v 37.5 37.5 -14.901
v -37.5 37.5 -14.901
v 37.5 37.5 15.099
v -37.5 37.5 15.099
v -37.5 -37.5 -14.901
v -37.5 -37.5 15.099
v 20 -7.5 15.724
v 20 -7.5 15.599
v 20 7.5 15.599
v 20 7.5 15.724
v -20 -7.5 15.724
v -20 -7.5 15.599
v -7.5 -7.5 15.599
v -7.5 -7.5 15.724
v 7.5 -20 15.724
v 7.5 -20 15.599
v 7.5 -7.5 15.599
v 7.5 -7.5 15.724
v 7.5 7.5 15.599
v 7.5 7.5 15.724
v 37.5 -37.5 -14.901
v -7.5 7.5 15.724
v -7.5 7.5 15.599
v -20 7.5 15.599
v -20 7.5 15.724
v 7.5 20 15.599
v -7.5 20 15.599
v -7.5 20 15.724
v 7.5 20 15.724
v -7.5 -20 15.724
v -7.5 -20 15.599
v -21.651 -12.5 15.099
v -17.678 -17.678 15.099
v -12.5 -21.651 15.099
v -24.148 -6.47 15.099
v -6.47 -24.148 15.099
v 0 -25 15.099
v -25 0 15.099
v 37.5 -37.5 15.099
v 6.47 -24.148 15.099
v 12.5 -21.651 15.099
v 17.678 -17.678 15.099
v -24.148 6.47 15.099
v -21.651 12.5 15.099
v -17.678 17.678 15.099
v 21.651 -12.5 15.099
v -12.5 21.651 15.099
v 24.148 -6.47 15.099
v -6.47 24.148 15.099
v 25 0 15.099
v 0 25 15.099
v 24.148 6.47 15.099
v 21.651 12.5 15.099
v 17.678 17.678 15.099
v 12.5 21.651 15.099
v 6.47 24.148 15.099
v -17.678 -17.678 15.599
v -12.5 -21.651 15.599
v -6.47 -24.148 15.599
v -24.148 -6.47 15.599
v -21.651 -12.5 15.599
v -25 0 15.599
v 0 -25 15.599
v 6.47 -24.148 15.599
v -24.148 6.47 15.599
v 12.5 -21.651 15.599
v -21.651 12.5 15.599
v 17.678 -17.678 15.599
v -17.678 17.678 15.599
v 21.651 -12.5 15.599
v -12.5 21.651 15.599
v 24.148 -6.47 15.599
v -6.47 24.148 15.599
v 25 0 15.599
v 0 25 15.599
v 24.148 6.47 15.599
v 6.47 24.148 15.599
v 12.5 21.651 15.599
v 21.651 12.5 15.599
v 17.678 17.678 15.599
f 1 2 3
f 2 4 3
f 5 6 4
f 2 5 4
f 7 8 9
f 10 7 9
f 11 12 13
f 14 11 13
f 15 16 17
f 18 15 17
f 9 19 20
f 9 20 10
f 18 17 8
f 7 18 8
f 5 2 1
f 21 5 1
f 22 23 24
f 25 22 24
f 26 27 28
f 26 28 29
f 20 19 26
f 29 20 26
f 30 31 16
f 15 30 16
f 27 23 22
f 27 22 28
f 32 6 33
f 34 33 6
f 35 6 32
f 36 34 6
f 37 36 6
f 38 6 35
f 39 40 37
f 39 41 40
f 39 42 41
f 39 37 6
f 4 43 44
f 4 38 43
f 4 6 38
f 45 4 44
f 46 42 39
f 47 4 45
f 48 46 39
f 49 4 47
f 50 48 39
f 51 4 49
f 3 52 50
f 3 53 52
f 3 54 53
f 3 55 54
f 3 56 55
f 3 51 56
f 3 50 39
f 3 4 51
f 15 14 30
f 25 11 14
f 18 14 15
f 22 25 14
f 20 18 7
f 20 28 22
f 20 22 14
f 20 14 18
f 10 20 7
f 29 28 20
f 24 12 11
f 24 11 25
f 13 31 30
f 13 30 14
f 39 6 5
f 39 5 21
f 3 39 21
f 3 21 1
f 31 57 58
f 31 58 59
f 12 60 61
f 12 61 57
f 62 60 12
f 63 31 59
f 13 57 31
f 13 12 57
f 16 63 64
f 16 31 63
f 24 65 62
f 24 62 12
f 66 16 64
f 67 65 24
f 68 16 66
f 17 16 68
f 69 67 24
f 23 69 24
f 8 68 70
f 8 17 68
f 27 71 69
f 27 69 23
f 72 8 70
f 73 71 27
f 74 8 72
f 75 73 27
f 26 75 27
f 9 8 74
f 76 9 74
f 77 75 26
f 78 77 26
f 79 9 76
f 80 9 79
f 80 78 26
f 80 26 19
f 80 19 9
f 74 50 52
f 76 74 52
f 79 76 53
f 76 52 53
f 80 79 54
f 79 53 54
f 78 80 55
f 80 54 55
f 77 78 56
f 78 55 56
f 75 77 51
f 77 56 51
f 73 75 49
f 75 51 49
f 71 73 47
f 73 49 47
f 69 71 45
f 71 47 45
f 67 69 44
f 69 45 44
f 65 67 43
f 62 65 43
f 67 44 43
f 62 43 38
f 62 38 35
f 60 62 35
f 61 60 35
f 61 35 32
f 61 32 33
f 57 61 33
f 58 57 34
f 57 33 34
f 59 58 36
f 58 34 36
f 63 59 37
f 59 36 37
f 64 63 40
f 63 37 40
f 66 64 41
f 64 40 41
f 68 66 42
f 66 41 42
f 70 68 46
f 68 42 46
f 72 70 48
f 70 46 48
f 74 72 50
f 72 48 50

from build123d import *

# Parameters (mm, degrees)
SKETCH1_W           = 150
SKETCH1_H           = 150
BOSS_EXTRUDE1_DEPTH = 30
SKETCH2_R           = 50
BOSS_EXTRUDE2_DEPTH = 1
SKETCH3_W           = 25
SKETCH3_H           = 30
SKETCH3_W_2         = 30
SKETCH3_H_2         = 25
BOSS_EXTRUDE3_DEPTH = 1.25
SCALE1_SCALE        = 0.5


with BuildPart() as part:
    # Sketch1 → Boss-Extrude1 (new body, symmetric)
    with BuildSketch(Plane.XY):
        Rectangle(SKETCH1_W, SKETCH1_H)
    extrude(amount=BOSS_EXTRUDE1_DEPTH, both=True)

    # Sketch2 → Boss-Extrude2 (add)
    with BuildSketch(Plane.XY.offset(30)):
        Circle(SKETCH2_R)
    extrude(amount=BOSS_EXTRUDE2_DEPTH)

    # Sketch3 → Boss-Extrude3 (add)
    with BuildSketch(Plane.XY.offset(30)):
        with Locations((-27.5, 0)):
            Rectangle(SKETCH3_W, SKETCH3_H)
        Rectangle(SKETCH3_W_2, SKETCH3_H)
        with Locations((0, 27.5)):
            Rectangle(SKETCH3_W_2, SKETCH3_H_2)
        with Locations((27.5, 0)):
            Rectangle(SKETCH3_W, SKETCH3_H)
        with Locations((0, -27.5)):
            Rectangle(SKETCH3_W_2, SKETCH3_H_2)
    extrude(amount=BOSS_EXTRUDE3_DEPTH)


with BuildPart() as part_1:
    # Scale1: scaled about (0, 0, 0.198621989)
    add(part.part.scale(SCALE1_SCALE).moved(Location((0, 0, 0.099310994))))


solid = part_1.part
